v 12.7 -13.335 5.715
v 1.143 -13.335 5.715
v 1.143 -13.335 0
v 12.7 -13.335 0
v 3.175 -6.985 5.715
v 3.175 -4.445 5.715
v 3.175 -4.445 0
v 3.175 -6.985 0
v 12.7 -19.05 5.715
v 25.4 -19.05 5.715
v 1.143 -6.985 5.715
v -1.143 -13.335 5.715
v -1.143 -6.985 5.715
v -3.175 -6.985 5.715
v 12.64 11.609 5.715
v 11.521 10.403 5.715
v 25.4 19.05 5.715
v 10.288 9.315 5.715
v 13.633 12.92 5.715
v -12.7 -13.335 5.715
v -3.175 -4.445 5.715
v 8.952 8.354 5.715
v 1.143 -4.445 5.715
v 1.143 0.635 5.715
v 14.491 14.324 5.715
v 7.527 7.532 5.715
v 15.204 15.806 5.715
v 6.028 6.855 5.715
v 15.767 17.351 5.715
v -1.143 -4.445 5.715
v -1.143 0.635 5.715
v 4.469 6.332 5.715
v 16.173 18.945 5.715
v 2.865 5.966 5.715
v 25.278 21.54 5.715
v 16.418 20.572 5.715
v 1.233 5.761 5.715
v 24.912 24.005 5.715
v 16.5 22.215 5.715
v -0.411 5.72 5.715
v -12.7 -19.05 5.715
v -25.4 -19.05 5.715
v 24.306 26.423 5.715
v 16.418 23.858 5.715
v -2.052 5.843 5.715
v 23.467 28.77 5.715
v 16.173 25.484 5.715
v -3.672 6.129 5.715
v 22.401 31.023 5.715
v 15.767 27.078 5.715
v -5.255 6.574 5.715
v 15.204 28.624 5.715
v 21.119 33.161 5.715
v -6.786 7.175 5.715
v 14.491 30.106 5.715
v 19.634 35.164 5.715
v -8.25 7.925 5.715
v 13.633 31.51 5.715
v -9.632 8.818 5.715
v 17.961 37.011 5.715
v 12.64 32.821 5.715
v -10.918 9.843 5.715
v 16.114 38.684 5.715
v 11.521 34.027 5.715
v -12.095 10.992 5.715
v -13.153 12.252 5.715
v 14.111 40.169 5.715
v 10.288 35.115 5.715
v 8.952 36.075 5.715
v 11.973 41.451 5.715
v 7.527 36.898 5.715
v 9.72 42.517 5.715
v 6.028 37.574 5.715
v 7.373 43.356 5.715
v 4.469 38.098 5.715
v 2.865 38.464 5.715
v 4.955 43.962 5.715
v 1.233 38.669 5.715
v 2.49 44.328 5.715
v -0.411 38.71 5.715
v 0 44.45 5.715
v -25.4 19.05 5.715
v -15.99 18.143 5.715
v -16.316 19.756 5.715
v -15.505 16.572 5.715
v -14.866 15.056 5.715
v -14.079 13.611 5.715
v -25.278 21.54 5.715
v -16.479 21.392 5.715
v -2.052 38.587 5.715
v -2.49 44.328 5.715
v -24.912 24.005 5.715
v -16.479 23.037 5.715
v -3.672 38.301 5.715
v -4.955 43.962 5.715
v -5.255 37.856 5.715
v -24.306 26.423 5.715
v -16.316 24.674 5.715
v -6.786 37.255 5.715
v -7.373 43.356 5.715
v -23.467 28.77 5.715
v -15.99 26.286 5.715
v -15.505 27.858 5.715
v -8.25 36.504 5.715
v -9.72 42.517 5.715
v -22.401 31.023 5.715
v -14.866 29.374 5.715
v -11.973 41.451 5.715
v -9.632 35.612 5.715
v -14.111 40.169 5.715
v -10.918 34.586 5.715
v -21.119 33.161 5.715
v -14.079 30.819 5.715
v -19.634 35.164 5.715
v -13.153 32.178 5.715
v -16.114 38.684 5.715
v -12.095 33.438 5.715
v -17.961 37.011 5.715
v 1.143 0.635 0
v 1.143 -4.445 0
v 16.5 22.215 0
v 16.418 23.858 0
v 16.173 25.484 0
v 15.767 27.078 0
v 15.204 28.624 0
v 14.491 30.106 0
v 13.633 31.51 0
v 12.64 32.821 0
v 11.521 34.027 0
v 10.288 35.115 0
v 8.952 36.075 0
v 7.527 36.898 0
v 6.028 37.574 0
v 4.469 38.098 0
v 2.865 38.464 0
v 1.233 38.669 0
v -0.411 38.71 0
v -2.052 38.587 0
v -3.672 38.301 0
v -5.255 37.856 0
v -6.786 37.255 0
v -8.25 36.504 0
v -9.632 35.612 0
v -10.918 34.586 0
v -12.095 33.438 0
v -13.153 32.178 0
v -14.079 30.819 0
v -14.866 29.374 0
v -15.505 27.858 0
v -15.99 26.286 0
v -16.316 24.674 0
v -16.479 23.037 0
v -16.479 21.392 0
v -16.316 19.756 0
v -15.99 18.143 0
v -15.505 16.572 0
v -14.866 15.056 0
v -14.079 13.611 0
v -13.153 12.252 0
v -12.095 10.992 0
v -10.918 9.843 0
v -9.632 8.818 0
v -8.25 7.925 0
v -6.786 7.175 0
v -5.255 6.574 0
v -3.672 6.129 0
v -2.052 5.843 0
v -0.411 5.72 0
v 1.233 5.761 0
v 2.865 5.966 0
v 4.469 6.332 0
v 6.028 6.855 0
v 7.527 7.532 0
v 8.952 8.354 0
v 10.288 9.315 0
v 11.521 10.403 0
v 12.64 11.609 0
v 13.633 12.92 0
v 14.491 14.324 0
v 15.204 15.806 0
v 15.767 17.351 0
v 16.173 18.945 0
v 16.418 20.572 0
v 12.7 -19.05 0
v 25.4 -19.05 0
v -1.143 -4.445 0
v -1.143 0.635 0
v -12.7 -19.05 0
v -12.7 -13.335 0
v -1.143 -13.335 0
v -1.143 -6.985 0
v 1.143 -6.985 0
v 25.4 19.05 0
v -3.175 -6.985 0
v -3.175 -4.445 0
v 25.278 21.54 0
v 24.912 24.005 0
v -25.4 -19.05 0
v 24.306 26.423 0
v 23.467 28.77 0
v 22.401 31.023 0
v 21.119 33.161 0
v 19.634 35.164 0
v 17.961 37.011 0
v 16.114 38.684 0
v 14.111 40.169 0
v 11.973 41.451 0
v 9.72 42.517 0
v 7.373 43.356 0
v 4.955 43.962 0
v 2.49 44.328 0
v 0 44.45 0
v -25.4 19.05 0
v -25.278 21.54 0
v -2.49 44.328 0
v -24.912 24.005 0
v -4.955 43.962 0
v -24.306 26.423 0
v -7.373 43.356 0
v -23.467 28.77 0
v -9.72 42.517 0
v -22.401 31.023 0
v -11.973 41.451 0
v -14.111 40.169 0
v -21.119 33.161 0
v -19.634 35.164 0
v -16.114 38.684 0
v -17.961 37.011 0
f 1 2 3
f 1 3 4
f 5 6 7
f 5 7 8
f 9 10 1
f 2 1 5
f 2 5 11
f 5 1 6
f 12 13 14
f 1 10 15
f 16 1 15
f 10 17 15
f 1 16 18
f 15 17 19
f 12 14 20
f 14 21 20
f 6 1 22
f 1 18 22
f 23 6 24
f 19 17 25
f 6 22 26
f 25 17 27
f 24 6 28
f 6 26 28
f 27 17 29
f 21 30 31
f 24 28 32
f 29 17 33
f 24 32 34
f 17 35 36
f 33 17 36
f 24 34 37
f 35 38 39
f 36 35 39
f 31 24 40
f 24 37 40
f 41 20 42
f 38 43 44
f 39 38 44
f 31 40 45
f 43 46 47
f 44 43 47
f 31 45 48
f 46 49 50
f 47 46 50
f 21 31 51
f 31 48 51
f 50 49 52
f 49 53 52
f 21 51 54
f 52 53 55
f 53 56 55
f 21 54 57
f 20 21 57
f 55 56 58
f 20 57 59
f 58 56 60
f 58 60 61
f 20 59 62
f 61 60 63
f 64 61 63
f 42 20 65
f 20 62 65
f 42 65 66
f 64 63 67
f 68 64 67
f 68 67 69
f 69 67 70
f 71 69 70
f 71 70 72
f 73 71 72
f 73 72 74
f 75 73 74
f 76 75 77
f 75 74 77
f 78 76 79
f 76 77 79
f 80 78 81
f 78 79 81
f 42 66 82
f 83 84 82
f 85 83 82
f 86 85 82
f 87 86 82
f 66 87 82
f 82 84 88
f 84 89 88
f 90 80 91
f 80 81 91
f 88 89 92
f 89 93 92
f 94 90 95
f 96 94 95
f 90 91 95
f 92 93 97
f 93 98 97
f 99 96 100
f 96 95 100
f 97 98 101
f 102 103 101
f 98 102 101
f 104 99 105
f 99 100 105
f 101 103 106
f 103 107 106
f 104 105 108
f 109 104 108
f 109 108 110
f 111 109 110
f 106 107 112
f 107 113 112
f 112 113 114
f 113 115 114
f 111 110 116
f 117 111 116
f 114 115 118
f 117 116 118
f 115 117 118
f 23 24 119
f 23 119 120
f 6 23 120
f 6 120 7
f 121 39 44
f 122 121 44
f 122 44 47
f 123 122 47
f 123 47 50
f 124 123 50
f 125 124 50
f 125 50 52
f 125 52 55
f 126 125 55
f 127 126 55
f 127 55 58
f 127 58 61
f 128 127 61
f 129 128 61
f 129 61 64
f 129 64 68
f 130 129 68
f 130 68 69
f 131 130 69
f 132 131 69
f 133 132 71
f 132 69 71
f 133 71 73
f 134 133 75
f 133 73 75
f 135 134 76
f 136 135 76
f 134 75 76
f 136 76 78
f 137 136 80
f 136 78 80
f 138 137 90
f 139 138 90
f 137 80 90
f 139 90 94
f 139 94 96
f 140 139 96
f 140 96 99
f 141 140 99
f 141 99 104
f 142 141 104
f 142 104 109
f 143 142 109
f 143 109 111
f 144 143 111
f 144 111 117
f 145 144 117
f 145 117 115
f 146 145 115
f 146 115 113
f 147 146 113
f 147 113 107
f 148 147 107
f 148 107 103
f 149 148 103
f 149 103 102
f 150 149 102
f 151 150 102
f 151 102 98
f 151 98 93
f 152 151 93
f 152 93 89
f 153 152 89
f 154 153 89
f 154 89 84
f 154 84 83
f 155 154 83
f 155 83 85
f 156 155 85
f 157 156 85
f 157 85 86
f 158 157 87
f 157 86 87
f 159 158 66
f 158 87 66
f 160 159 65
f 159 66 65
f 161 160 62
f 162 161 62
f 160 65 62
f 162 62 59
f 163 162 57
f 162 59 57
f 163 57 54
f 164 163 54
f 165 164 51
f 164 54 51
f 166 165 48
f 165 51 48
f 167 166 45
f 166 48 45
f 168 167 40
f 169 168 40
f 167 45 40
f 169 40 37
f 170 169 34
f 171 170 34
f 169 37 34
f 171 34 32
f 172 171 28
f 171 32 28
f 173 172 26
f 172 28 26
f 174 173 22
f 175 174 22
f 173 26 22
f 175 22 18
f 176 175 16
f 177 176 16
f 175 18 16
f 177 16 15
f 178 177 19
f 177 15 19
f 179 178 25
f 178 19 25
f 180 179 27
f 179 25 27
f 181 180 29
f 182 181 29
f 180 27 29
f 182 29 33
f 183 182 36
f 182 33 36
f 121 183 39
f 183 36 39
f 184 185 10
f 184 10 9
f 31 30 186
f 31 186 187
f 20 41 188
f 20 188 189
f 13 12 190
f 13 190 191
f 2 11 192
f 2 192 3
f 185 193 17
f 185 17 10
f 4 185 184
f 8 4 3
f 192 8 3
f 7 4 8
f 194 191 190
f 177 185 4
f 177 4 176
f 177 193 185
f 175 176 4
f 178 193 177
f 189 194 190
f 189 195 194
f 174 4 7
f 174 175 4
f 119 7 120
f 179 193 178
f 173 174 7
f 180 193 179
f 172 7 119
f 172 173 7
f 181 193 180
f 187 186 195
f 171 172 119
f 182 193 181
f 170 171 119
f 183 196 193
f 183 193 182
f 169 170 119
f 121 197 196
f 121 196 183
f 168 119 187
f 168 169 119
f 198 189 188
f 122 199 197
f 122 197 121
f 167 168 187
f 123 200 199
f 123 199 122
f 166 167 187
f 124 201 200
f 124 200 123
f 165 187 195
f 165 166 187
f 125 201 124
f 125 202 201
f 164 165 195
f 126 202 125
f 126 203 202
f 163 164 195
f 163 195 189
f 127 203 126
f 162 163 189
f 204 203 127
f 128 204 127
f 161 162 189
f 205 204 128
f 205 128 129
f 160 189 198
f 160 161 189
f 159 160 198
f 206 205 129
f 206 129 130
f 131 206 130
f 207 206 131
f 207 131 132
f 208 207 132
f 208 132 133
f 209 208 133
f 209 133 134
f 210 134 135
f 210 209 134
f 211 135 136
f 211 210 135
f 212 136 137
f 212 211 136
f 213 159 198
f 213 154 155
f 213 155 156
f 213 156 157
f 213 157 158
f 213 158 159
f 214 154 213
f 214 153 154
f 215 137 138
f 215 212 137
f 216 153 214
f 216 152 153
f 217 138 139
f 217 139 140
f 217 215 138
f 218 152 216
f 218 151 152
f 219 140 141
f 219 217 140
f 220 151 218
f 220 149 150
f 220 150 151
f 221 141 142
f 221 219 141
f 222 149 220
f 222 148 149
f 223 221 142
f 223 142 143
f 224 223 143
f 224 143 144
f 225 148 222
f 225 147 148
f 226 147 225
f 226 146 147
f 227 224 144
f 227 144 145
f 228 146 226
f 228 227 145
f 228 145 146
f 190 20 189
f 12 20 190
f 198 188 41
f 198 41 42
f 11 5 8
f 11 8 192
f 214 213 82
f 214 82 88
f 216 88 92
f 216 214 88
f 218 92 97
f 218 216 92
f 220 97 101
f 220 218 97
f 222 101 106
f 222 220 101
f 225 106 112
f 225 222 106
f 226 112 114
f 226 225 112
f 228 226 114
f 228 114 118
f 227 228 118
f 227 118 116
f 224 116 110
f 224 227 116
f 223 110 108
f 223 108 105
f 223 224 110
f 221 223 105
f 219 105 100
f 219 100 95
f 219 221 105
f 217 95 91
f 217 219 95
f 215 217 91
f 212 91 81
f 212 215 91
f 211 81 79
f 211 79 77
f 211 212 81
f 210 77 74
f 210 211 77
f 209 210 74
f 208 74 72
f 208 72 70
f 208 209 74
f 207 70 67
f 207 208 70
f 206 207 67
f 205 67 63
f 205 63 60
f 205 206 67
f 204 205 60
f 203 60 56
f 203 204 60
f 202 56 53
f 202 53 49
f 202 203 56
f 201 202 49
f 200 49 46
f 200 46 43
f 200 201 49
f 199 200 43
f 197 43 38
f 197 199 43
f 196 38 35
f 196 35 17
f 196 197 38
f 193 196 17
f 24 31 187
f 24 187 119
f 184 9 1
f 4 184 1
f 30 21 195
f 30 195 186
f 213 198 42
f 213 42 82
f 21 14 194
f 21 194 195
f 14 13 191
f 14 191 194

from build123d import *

# Parameters (mm, degrees)
BOSS_EXTRUDE1_DEPTH = 5.715
CUT_EXTRUDE1_REACH  = 53.513
SKETCH2_R           = 16.5
CUT_EXTRUDE2_REACH  = 53.513
SKETCH3_W           = 25.4
SKETCH3_H           = 5.715
CUT_EXTRUDE4_REACH  = 53.513


with BuildPart() as part:
    # Sketch1 → Boss-Extrude1 (new body)
    with BuildSketch(Plane.XY):
        with BuildLine():
            Line((25.4, -19.05), (-25.4, -19.05))
            Line((-25.4, -19.05), (-25.4, 19.05))
            ThreePointArc((-25.4, 19.05), (0, 44.45), (25.4, 19.05))
            Line((25.4, 19.05), (25.4, -19.05))
        make_face()
    extrude(amount=BOSS_EXTRUDE1_DEPTH)

    # Sketch2 → Cut-Extrude1 (cut, up to next)
    with BuildSketch(Plane.XY.offset(5.715), mode=Mode.PRIVATE) as cut_extrude1_sk1:
        with Locations((0, 22.21484)):
            Circle(SKETCH2_R)
    cut_extrude1_tool1 = extrude(cut_extrude1_sk1.sketch, amount=-CUT_EXTRUDE1_REACH, mode=Mode.PRIVATE) & part.part
    add(cut_extrude1_tool1.solids().sort_by_distance((0, 22.21484, 5.715))[0], mode=Mode.SUBTRACT)

    # Sketch3 → Cut-Extrude2 (cut, up to next)
    with BuildSketch(Plane.XY.offset(5.715), mode=Mode.PRIVATE) as cut_extrude2_sk1:
        with Locations((0, -16.1925)):
            Rectangle(SKETCH3_W, SKETCH3_H)
    cut_extrude2_tool1 = extrude(cut_extrude2_sk1.sketch, amount=-CUT_EXTRUDE2_REACH, mode=Mode.PRIVATE) & part.part
    add(cut_extrude2_tool1.solids().sort_by_distance((0, -16.1925, 5.715))[0], mode=Mode.SUBTRACT)

    # Sketch5 → Cut-Extrude4 (cut, up to next)
    with BuildSketch(Plane.XY.offset(5.715), mode=Mode.PRIVATE) as cut_extrude4_sk1:
        Polygon((3.175, -6.985), (1.143, -6.985), (1.143, -13.335), (-1.143, -13.335), (-1.143, -6.985), (-3.175, -6.985), (-3.175, -4.445), (-1.143, -4.445), (-1.143, 0.635), (1.143, 0.635), (1.143, -4.445), (3.175, -4.445), align=None)
    cut_extrude4_tool1 = extrude(cut_extrude4_sk1.sketch, amount=-CUT_EXTRUDE4_REACH, mode=Mode.PRIVATE) & part.part
    add(cut_extrude4_tool1.solids().sort_by_distance((0, -6.194885, 5.715))[0], mode=Mode.SUBTRACT)


solid = part.part
